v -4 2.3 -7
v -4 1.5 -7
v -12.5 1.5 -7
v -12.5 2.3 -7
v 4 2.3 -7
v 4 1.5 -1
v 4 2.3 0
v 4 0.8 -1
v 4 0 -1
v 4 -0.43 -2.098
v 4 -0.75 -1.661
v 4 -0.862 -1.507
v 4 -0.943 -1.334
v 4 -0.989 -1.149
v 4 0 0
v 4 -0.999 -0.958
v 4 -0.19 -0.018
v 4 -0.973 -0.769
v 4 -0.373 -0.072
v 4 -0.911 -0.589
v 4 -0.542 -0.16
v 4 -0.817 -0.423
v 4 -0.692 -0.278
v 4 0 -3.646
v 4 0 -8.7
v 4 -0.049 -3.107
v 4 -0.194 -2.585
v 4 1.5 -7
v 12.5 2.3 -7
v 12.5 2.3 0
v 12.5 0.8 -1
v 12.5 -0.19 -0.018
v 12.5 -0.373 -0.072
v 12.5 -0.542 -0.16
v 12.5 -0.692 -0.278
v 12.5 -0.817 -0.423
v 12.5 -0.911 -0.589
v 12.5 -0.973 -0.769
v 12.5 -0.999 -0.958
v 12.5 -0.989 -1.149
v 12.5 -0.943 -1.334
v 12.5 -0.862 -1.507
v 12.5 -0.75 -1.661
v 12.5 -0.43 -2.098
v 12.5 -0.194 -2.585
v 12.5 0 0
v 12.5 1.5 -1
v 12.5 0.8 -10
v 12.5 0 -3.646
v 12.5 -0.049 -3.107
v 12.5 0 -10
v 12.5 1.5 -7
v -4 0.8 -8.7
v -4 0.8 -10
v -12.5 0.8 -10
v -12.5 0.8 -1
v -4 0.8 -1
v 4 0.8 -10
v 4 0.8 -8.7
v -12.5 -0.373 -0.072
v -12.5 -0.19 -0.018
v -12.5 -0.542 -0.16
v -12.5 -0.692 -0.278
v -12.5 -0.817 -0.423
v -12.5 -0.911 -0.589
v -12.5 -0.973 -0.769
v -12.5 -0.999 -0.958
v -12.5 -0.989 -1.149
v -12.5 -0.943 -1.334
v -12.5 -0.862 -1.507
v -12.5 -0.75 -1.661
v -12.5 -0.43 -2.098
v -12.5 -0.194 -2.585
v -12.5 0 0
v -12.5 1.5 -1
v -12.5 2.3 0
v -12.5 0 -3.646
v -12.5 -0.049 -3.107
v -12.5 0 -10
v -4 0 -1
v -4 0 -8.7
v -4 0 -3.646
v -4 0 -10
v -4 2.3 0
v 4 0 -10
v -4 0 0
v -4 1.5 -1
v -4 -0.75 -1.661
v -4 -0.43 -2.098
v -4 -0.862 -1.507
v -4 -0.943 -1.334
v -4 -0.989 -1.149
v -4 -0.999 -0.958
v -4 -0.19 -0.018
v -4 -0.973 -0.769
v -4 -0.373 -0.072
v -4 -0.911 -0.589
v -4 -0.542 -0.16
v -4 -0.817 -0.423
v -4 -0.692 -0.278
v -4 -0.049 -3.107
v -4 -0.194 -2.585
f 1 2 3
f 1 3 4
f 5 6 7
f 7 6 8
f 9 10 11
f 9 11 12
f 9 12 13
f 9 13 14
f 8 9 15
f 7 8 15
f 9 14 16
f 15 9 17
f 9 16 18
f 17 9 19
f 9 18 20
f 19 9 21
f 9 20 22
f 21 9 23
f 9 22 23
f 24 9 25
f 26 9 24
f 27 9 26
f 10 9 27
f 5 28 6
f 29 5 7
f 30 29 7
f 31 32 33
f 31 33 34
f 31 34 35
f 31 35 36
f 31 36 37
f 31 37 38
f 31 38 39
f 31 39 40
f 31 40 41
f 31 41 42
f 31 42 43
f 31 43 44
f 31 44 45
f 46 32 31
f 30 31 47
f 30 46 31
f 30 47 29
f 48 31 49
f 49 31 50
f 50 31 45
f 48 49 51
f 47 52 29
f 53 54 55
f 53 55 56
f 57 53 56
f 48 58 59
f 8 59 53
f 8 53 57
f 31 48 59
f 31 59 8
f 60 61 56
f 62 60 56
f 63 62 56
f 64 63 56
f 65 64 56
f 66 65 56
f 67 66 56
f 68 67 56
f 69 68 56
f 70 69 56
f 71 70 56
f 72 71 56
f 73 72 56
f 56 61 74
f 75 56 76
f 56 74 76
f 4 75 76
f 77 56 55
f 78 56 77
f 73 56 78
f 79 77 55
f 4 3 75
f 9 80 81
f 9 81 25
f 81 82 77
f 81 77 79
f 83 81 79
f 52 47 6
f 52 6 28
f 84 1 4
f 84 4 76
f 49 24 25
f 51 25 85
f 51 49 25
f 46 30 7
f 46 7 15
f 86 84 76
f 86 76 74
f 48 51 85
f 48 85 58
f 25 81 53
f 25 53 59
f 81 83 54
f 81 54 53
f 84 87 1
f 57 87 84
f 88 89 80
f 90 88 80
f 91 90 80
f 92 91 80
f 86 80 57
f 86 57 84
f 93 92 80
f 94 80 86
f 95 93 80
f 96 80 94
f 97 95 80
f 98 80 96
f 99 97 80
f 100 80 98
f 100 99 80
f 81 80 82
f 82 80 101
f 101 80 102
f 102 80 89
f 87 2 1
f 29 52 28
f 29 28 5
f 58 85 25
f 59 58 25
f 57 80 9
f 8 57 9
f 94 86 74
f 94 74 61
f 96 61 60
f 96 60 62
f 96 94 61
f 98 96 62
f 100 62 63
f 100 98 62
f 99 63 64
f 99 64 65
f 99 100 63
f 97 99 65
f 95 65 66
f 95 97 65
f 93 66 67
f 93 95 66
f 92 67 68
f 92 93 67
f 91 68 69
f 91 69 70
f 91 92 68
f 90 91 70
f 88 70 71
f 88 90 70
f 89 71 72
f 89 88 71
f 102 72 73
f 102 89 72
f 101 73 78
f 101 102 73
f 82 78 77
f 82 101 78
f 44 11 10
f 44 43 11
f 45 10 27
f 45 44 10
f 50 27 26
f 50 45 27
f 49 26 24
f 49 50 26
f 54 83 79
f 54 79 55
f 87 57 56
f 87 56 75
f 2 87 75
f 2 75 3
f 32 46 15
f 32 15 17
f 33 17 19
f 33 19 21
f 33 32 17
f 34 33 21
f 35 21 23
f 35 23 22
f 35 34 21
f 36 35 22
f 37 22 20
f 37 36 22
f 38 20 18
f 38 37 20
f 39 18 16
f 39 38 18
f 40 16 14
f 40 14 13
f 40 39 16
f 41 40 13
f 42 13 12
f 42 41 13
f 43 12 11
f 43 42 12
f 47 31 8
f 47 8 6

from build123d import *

# Parameters (mm, degrees)
F1_DEPTH = 12.5
F2_W     = 8
F2_H     = 1
F2_H_2   = 1.3
F3_DEPTH = 2.301
F4_W     = 8
F4_H     = 0.8
F4_H_2   = 1.117703
F5_DEPTH = 10.001
F6_R     = 3


with BuildPart() as f1:
    # F0 (on Right) → F1 (new body, symmetric)
    with BuildSketch(Plane.YZ):
        with BuildLine():
            Line((2.3, -7), (2.3, 0))
            Line((2.3, 0), (0, 0))
            ThreePointArc((0, 0), (-1, -1), (0, -2))
            Line((0, -2), (0, -10))
            Line((0, -10), (0.8, -10))
            Line((0.8, -10), (0.8, -1))
            Line((0.8, -1), (1.5, -1))
            Line((1.5, -1), (1.5, -7))
            Line((1.5, -7), (2.3, -7))
        make_face()
    extrude(amount=F1_DEPTH, both=True)

    # F2 (on Front) → F3 (cut, through all)
    with BuildSketch(Plane.XZ):
        with Locations((0, -0.5)):
            Rectangle(F2_W, F2_H)
        with Locations((0, -9.35)):
            Rectangle(F2_W, F2_H_2)
    extrude(amount=-F3_DEPTH, mode=Mode.SUBTRACT)

    # F4 (on Top) → F5 (cut, through all)
    with BuildSketch(Plane.XY):
        with Locations((0, 1.9)):
            Rectangle(F4_W, F4_H)
        with Locations((0, -0.558851)):
            Rectangle(F4_W, F4_H_2)
    extrude(amount=-F5_DEPTH, mode=Mode.SUBTRACT)

    # F6
    f6_edges = [f1.edges().sort_by_distance(p)[0] for p in [
        (8.25, 0, -2),
        (-8.25, 0, -2),
    ]]
    fillet(f6_edges, radius=F6_R)


solid = f1.part
